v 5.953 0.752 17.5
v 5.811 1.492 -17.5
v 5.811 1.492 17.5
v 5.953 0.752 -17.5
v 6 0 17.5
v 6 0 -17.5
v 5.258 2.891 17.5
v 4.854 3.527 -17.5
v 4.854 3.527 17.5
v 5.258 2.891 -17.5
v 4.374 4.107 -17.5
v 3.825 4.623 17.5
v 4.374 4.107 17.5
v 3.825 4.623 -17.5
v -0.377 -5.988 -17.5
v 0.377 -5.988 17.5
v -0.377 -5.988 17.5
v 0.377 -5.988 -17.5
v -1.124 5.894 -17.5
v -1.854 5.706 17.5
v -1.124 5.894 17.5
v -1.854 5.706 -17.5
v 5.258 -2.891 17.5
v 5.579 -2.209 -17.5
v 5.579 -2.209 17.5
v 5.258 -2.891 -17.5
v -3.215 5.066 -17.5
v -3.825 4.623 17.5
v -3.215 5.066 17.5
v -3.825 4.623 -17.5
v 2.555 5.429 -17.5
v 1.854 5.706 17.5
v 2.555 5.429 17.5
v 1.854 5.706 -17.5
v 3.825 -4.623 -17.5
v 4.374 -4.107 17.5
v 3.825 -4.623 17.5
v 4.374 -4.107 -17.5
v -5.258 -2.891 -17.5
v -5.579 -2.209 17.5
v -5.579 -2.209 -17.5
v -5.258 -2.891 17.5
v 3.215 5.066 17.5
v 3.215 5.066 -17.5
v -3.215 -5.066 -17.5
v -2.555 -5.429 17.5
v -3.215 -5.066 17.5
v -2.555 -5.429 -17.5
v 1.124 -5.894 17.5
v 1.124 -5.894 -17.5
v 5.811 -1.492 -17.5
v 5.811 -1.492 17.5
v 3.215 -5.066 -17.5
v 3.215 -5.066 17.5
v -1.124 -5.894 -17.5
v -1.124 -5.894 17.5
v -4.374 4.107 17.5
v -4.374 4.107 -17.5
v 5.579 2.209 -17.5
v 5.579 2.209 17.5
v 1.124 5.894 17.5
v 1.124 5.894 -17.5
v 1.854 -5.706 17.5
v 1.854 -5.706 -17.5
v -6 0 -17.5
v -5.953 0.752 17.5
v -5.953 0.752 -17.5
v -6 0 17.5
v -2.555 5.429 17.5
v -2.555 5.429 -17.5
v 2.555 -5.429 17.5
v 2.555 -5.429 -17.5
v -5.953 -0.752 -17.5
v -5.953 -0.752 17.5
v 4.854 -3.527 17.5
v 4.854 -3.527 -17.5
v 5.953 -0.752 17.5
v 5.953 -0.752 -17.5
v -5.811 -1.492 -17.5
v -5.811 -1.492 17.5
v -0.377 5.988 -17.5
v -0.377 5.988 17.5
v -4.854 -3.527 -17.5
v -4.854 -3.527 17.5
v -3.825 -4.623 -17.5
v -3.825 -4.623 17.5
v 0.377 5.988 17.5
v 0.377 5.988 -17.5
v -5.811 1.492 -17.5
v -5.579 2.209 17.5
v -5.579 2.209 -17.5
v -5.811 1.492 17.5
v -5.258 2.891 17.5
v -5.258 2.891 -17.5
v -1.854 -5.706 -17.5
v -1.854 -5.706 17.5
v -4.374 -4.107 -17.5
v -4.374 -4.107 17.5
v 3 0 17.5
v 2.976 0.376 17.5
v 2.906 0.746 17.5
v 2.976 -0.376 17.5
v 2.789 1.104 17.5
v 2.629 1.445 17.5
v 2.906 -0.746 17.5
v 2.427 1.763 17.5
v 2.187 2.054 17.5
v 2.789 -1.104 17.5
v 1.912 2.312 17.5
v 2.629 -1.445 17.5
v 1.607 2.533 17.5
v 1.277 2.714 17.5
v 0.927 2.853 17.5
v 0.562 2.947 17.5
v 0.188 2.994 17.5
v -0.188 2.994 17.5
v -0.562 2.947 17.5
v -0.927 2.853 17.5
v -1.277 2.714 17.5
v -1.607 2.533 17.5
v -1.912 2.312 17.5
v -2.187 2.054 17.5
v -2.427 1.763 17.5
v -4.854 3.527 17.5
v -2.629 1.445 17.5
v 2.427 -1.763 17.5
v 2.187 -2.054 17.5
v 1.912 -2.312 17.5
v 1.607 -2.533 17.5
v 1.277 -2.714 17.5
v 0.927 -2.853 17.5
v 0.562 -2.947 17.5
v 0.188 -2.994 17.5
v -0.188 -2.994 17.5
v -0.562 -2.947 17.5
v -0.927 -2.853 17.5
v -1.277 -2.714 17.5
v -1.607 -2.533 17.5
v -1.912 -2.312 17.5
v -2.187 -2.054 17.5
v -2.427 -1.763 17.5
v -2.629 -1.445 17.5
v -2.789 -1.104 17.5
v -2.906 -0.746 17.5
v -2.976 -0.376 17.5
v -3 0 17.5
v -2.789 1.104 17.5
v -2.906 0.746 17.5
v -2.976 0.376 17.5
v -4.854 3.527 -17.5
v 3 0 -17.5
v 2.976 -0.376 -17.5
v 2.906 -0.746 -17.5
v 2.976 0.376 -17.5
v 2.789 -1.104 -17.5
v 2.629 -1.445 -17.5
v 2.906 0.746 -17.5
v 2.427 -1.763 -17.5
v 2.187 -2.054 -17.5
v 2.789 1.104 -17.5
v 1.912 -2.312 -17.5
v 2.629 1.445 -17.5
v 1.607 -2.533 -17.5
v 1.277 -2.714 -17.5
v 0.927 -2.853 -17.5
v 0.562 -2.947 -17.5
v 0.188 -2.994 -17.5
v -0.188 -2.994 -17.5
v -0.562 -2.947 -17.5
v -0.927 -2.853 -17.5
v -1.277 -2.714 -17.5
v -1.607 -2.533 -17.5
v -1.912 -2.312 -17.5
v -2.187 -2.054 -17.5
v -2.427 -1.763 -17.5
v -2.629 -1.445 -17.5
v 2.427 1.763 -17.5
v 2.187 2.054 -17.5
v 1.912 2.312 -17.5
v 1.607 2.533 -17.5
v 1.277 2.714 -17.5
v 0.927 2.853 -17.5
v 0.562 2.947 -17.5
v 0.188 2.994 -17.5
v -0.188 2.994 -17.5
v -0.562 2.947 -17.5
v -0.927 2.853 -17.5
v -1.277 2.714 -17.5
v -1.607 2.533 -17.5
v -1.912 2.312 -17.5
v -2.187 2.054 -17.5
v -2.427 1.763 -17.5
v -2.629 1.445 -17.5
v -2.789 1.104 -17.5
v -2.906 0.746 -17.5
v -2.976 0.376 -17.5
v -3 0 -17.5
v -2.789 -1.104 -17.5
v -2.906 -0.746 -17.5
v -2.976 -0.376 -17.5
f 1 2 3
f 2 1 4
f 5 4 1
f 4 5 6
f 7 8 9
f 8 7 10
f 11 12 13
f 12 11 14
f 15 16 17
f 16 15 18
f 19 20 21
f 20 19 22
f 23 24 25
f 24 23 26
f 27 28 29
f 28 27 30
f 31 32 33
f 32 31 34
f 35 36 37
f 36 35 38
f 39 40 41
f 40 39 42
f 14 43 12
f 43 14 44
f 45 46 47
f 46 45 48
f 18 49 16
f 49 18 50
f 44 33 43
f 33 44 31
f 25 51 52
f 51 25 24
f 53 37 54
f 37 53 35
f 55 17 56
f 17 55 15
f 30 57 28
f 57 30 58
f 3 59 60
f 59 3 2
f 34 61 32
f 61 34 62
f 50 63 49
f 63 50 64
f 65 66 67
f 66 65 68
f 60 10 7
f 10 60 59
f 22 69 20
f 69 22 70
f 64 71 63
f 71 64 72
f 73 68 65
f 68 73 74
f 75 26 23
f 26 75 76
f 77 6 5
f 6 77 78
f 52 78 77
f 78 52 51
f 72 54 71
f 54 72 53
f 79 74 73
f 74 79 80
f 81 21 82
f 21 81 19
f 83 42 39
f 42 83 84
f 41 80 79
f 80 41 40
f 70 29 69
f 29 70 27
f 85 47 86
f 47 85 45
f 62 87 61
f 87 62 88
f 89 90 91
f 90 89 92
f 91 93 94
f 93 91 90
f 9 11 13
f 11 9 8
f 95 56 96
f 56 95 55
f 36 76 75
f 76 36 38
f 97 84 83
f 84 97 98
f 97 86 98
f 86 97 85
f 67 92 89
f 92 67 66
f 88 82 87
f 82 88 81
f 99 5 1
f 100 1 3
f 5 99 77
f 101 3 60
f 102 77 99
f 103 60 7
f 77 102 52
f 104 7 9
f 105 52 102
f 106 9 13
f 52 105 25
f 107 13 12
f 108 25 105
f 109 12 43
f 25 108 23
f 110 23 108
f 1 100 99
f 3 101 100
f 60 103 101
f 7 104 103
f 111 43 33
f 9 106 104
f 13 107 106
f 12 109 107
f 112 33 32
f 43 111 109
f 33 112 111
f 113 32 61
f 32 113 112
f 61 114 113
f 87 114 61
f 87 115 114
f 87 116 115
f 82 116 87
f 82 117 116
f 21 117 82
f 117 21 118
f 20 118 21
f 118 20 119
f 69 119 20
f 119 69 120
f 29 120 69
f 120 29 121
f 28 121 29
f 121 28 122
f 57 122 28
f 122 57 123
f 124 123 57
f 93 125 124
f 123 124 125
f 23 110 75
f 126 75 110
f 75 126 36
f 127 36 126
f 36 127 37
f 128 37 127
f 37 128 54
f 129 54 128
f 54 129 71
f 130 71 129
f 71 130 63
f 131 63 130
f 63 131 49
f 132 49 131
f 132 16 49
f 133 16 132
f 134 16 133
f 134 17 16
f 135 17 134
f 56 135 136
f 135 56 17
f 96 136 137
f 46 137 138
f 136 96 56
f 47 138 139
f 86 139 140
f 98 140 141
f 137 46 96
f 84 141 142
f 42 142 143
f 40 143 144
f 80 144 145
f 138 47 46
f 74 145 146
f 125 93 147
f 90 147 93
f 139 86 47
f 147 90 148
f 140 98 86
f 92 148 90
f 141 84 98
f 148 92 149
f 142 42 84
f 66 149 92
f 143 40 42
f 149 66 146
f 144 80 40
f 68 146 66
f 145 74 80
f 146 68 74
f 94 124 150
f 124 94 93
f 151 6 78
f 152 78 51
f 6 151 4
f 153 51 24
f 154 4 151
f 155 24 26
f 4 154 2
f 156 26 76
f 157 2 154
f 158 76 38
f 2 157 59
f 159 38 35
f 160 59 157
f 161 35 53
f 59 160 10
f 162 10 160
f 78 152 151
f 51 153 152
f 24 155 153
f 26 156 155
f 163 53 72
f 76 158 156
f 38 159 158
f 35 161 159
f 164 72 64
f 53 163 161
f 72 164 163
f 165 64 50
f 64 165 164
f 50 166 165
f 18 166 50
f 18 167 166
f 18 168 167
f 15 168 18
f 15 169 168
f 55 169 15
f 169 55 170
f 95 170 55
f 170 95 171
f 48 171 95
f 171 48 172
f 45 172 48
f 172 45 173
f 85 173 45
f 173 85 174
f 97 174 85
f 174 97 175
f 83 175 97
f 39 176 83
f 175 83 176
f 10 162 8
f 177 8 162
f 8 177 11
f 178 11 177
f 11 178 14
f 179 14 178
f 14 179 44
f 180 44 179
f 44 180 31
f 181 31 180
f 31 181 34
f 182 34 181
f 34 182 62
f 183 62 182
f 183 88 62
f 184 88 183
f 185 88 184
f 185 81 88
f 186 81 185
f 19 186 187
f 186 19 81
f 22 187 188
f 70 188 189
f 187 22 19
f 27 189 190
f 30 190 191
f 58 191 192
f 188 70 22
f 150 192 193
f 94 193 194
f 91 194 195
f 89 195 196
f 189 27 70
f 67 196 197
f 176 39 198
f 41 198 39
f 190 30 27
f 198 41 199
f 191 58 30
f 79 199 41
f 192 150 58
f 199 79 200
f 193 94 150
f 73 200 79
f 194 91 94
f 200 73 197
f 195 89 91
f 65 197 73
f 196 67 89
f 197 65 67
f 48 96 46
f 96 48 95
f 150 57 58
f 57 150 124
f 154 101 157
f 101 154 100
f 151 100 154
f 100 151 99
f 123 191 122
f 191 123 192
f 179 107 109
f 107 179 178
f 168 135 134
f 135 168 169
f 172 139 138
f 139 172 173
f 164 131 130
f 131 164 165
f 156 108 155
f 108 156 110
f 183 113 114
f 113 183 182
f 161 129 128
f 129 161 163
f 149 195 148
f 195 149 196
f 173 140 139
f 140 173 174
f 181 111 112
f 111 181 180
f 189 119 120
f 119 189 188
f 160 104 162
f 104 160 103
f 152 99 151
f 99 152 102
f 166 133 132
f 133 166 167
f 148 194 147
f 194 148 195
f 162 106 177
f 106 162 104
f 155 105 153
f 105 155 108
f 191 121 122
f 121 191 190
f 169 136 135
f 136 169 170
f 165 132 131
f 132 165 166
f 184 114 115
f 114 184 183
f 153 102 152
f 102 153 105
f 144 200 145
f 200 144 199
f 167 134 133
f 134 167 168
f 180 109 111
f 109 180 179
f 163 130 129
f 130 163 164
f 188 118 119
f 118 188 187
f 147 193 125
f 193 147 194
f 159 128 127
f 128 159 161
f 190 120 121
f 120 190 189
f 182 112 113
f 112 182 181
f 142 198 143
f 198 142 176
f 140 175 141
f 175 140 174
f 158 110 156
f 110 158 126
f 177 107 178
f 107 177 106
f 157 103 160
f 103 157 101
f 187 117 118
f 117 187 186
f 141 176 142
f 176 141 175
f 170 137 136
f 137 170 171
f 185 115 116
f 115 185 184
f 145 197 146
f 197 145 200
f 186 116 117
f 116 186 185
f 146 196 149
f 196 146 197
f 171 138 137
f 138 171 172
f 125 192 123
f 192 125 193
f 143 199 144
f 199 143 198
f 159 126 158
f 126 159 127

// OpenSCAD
$fn = 50;


difference() {
	union() {
		translate(v = [0, 0, -17.5000000000]) {
			cylinder(h = 35, r = 6.0000000000);
		}
	}
	union() {
		translate(v = [0, 0, -100.0000000000]) {
			cylinder(h = 200, r = 3.0000000000);
		}
	}
}
